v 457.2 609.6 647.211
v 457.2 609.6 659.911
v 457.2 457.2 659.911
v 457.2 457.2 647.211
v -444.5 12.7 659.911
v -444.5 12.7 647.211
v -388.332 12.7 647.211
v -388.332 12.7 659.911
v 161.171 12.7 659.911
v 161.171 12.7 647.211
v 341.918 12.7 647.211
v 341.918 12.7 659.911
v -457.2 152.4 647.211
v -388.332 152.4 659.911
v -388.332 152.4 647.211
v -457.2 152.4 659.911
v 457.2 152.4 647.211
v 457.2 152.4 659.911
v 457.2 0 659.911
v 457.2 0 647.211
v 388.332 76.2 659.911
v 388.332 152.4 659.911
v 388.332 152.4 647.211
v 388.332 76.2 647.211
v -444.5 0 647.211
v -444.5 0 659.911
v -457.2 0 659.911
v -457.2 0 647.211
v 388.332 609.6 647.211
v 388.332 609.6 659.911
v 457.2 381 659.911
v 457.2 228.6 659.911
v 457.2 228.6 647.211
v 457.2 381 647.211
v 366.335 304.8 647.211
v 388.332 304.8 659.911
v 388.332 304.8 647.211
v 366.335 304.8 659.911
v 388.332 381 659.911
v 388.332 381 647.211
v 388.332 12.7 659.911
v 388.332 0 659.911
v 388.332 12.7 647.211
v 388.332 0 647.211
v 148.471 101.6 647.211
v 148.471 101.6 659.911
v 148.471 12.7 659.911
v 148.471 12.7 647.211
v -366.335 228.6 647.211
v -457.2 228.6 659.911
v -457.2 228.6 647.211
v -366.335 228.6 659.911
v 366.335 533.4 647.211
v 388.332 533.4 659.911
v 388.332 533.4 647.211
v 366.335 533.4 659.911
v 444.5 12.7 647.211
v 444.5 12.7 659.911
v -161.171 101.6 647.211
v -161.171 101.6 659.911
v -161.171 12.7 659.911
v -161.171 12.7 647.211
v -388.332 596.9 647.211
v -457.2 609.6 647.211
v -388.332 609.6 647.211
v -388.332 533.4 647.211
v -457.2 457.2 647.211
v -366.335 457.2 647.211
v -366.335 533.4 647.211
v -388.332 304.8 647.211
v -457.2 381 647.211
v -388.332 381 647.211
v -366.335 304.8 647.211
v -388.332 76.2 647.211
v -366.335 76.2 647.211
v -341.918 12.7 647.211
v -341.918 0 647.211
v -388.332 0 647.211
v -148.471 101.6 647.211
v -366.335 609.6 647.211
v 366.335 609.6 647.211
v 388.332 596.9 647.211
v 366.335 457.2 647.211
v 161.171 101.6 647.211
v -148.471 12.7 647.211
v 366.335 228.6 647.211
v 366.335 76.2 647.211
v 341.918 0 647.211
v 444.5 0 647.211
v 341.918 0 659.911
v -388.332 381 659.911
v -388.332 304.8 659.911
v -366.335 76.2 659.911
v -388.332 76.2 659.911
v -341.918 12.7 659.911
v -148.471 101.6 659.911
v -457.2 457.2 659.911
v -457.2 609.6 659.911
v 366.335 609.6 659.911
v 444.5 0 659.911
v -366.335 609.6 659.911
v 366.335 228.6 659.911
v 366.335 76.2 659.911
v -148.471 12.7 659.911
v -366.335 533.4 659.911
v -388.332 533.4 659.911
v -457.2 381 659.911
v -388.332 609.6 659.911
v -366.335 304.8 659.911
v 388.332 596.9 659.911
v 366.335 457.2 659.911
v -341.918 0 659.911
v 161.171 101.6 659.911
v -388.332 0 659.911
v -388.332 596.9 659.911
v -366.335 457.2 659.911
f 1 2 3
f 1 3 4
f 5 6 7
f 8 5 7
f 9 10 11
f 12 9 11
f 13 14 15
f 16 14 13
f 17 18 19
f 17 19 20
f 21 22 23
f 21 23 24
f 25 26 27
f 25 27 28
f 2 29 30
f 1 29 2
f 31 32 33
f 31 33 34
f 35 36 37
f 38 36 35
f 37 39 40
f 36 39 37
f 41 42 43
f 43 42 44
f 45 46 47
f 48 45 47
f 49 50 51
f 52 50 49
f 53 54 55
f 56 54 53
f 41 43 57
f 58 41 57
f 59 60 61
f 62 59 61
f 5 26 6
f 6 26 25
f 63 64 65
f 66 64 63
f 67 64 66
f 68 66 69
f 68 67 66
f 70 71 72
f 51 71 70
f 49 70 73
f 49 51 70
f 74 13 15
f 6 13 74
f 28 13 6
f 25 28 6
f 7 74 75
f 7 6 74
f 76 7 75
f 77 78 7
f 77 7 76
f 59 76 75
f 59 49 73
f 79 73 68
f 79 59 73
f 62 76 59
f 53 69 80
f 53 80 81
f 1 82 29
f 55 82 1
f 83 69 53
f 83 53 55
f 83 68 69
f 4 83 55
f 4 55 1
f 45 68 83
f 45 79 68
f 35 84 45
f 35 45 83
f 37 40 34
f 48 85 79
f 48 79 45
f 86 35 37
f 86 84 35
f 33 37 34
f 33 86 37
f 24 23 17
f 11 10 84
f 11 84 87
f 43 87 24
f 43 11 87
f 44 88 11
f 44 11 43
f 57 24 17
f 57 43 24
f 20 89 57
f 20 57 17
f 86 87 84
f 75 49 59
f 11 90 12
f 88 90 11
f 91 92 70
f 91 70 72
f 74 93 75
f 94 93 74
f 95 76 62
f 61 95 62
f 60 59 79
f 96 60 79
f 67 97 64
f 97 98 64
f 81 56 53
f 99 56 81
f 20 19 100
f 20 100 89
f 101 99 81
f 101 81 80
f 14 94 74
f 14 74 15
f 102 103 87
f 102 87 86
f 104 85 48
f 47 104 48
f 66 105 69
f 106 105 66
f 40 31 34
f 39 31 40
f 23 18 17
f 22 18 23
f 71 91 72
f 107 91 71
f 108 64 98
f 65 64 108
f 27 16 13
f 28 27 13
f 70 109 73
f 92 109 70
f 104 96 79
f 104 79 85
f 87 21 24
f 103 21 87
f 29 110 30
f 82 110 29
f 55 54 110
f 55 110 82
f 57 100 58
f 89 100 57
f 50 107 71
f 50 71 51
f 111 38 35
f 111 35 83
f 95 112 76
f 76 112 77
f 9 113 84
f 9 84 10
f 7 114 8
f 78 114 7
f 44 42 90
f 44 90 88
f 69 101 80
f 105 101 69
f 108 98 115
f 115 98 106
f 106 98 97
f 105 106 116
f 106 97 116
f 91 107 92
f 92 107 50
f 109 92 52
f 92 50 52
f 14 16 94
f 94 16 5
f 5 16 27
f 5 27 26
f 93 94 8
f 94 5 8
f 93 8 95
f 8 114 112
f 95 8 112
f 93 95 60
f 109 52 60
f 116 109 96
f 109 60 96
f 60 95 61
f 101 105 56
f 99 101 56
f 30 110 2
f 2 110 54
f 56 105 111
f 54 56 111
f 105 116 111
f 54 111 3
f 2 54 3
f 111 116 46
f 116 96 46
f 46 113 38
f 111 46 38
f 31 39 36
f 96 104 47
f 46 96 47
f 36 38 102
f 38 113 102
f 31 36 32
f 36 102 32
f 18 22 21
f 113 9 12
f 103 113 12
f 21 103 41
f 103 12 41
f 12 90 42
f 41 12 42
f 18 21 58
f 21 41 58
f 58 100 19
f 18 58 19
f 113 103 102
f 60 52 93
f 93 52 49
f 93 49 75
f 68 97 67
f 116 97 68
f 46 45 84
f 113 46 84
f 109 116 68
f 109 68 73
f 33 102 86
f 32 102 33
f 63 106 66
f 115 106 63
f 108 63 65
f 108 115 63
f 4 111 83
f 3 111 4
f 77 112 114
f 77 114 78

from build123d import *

# Parameters (mm, degrees)
SKETCH1_W           = 762
SKETCH1_H           = 12.7
BOSS_EXTRUDE1_DEPTH = 609.6
SKETCH2_W           = 12.7
SKETCH2_H           = 609.6
BOSS_EXTRUDE2_DEPTH = 76.2
SKETCH3_OUTSIDE_W   = 1136.21
SKETCH3_OUTSIDE_H   = 831.41
CUT_EXTRUDE1_DEPTH  = 12.7
SKETCH6_W           = 56.167651581
SKETCH6_H           = 12.7
SKETCH6_W_2         = 683.835303162
CUT_EXTRUDE2_DEPTH  = 12.7
SKETCH7_W           = 12.7
SKETCH7_H           = 88.9
CUT_EXTRUDE3_DEPTH  = 12.7
BOSS_EXTRUDE3_START = -101.6
SKETCH8_W           = 732.670606326
SKETCH8_H           = 12.7
BOSS_EXTRUDE3_DEPTH = 101.6
BOSS_EXTRUDE4_START = -12.7
SKETCH9_W           = 68.867651581
SKETCH9_H           = 12.7
BOSS_EXTRUDE4_DEPTH = 12.7


with BuildPart() as part:
    # Sketch1 → Boss-Extrude1 (new body)
    with BuildSketch(Plane(origin=(0, 0, 0), x_dir=(1, 0, 0), z_dir=(0, 1, 0))):
        with Locations((0, -653.561357684)):
            Rectangle(SKETCH1_W, SKETCH1_H)
    extrude(amount=BOSS_EXTRUDE1_DEPTH)

    # Sketch2 → Boss-Extrude2 (add)
    with BuildSketch(Plane(origin=(381, 0, 0), x_dir=(0, 0, -1), z_dir=(1, 0, 0))):
        with Locations((-653.561357684, 304.8)):
            Rectangle(SKETCH2_W, SKETCH2_H)
    boss_extrude2 = extrude(amount=BOSS_EXTRUDE2_DEPTH)

    # Mirror1: Boss-Extrude2 across plane
    add(boss_extrude2.mirror(Plane(origin=(0, 0, 0), x_dir=(0, 0, 1), z_dir=(1, 0, 0))))

    # Sketch3 outside → Cut-Extrude1 (cut)
    with BuildSketch(Plane.XY.offset(659.911357684)):
        with Locations((0, 304.8)):
            Rectangle(SKETCH3_OUTSIDE_W, SKETCH3_OUTSIDE_H)
        Polygon((366.335303163, 609.6), (-366.335303163, 609.6), (-366.335303163, 533.4), (-388.332348419, 533.4), (-388.332348419, 609.6), (-457.2, 609.6), (-457.2, 457.2), (-366.335303163, 457.2), (-366.335303163, 304.8), (-388.332348419, 304.8), (-388.332348419, 381), (-457.2, 381), (-457.2, 228.6), (-366.335303163, 228.6), (-366.335303163, 76.2), (-388.332348419, 76.2), (-388.332348419, 152.4), (-457.2, 152.4), (-457.2, 0), (457.2, 0), (457.2, 152.4), (388.332348419, 152.4), (388.332348419, 76.2), (366.335303163, 76.2), (366.335303163, 228.6), (457.2, 228.6), (457.2, 381), (388.332348419, 381), (388.332348419, 304.8), (366.335303163, 304.8), (366.335303163, 457.2), (457.2, 457.2), (457.2, 609.6), (388.332348419, 609.6), (388.332348419, 533.4), (366.335303163, 533.4), align=None, mode=Mode.SUBTRACT)
    extrude(amount=-CUT_EXTRUDE1_DEPTH, mode=Mode.SUBTRACT)

    # Sketch6 → Cut-Extrude2 (cut)
    with BuildSketch(Plane(origin=(0, 609.6, 0), x_dir=(1, 0, 0), z_dir=(0, 1, 0))):
        with Locations((-416.41617421, -653.561357684)):
            Rectangle(SKETCH6_W, SKETCH6_H)
        with Locations((0, -653.561357684)):
            Rectangle(SKETCH6_W_2, SKETCH6_H)
        with Locations((416.41617421, -653.561357684)):
            Rectangle(SKETCH6_W, SKETCH6_H)
    cut_extrude2 = extrude(amount=-CUT_EXTRUDE2_DEPTH, mode=Mode.SUBTRACT)

    # Sketch7 → Cut-Extrude3 (cut)
    with BuildSketch(Plane.XY.offset(659.911357684)):
        with Locations((154.820606325, 552.45)):
            Rectangle(SKETCH7_W, SKETCH7_H)
        with Locations((-154.820606325, 552.45)):
            Rectangle(SKETCH7_W, SKETCH7_H)
    cut_extrude3 = extrude(amount=-CUT_EXTRUDE3_DEPTH, mode=Mode.SUBTRACT)

    # Mirror2: Cut-Extrude2, Cut-Extrude3 across plane
    add(cut_extrude2.mirror(Plane(origin=(0, 304.8, 0), x_dir=(0, 0, 1), z_dir=(0, -1, 0))), mode=Mode.SUBTRACT)
    add(cut_extrude3.mirror(Plane(origin=(0, 304.8, 0), x_dir=(0, 0, 1), z_dir=(0, -1, 0))), mode=Mode.SUBTRACT)

    # Sketch8 → Boss-Extrude3 (add)
    with BuildSketch(Plane(origin=(0, 609.6, 0), x_dir=(1, 0, 0), z_dir=(0, 1, 0)).offset(BOSS_EXTRUDE3_START)):
        with Locations((0, -653.561357684)):
            Rectangle(SKETCH8_W, SKETCH8_H)
    extrude(amount=BOSS_EXTRUDE3_DEPTH)

    # Sketch9 → Boss-Extrude4 (add)
    with BuildSketch(Plane(origin=(0, 609.6, 0), x_dir=(1, 0, 0), z_dir=(0, 1, 0)).offset(BOSS_EXTRUDE4_START)):
        with Locations((422.76617421, -653.561357684)):
            Rectangle(SKETCH9_W, SKETCH9_H)
        with Locations((-422.76617421, -653.561357684)):
            Rectangle(SKETCH9_W, SKETCH9_H)
    extrude(amount=BOSS_EXTRUDE4_DEPTH)


solid = part.part
